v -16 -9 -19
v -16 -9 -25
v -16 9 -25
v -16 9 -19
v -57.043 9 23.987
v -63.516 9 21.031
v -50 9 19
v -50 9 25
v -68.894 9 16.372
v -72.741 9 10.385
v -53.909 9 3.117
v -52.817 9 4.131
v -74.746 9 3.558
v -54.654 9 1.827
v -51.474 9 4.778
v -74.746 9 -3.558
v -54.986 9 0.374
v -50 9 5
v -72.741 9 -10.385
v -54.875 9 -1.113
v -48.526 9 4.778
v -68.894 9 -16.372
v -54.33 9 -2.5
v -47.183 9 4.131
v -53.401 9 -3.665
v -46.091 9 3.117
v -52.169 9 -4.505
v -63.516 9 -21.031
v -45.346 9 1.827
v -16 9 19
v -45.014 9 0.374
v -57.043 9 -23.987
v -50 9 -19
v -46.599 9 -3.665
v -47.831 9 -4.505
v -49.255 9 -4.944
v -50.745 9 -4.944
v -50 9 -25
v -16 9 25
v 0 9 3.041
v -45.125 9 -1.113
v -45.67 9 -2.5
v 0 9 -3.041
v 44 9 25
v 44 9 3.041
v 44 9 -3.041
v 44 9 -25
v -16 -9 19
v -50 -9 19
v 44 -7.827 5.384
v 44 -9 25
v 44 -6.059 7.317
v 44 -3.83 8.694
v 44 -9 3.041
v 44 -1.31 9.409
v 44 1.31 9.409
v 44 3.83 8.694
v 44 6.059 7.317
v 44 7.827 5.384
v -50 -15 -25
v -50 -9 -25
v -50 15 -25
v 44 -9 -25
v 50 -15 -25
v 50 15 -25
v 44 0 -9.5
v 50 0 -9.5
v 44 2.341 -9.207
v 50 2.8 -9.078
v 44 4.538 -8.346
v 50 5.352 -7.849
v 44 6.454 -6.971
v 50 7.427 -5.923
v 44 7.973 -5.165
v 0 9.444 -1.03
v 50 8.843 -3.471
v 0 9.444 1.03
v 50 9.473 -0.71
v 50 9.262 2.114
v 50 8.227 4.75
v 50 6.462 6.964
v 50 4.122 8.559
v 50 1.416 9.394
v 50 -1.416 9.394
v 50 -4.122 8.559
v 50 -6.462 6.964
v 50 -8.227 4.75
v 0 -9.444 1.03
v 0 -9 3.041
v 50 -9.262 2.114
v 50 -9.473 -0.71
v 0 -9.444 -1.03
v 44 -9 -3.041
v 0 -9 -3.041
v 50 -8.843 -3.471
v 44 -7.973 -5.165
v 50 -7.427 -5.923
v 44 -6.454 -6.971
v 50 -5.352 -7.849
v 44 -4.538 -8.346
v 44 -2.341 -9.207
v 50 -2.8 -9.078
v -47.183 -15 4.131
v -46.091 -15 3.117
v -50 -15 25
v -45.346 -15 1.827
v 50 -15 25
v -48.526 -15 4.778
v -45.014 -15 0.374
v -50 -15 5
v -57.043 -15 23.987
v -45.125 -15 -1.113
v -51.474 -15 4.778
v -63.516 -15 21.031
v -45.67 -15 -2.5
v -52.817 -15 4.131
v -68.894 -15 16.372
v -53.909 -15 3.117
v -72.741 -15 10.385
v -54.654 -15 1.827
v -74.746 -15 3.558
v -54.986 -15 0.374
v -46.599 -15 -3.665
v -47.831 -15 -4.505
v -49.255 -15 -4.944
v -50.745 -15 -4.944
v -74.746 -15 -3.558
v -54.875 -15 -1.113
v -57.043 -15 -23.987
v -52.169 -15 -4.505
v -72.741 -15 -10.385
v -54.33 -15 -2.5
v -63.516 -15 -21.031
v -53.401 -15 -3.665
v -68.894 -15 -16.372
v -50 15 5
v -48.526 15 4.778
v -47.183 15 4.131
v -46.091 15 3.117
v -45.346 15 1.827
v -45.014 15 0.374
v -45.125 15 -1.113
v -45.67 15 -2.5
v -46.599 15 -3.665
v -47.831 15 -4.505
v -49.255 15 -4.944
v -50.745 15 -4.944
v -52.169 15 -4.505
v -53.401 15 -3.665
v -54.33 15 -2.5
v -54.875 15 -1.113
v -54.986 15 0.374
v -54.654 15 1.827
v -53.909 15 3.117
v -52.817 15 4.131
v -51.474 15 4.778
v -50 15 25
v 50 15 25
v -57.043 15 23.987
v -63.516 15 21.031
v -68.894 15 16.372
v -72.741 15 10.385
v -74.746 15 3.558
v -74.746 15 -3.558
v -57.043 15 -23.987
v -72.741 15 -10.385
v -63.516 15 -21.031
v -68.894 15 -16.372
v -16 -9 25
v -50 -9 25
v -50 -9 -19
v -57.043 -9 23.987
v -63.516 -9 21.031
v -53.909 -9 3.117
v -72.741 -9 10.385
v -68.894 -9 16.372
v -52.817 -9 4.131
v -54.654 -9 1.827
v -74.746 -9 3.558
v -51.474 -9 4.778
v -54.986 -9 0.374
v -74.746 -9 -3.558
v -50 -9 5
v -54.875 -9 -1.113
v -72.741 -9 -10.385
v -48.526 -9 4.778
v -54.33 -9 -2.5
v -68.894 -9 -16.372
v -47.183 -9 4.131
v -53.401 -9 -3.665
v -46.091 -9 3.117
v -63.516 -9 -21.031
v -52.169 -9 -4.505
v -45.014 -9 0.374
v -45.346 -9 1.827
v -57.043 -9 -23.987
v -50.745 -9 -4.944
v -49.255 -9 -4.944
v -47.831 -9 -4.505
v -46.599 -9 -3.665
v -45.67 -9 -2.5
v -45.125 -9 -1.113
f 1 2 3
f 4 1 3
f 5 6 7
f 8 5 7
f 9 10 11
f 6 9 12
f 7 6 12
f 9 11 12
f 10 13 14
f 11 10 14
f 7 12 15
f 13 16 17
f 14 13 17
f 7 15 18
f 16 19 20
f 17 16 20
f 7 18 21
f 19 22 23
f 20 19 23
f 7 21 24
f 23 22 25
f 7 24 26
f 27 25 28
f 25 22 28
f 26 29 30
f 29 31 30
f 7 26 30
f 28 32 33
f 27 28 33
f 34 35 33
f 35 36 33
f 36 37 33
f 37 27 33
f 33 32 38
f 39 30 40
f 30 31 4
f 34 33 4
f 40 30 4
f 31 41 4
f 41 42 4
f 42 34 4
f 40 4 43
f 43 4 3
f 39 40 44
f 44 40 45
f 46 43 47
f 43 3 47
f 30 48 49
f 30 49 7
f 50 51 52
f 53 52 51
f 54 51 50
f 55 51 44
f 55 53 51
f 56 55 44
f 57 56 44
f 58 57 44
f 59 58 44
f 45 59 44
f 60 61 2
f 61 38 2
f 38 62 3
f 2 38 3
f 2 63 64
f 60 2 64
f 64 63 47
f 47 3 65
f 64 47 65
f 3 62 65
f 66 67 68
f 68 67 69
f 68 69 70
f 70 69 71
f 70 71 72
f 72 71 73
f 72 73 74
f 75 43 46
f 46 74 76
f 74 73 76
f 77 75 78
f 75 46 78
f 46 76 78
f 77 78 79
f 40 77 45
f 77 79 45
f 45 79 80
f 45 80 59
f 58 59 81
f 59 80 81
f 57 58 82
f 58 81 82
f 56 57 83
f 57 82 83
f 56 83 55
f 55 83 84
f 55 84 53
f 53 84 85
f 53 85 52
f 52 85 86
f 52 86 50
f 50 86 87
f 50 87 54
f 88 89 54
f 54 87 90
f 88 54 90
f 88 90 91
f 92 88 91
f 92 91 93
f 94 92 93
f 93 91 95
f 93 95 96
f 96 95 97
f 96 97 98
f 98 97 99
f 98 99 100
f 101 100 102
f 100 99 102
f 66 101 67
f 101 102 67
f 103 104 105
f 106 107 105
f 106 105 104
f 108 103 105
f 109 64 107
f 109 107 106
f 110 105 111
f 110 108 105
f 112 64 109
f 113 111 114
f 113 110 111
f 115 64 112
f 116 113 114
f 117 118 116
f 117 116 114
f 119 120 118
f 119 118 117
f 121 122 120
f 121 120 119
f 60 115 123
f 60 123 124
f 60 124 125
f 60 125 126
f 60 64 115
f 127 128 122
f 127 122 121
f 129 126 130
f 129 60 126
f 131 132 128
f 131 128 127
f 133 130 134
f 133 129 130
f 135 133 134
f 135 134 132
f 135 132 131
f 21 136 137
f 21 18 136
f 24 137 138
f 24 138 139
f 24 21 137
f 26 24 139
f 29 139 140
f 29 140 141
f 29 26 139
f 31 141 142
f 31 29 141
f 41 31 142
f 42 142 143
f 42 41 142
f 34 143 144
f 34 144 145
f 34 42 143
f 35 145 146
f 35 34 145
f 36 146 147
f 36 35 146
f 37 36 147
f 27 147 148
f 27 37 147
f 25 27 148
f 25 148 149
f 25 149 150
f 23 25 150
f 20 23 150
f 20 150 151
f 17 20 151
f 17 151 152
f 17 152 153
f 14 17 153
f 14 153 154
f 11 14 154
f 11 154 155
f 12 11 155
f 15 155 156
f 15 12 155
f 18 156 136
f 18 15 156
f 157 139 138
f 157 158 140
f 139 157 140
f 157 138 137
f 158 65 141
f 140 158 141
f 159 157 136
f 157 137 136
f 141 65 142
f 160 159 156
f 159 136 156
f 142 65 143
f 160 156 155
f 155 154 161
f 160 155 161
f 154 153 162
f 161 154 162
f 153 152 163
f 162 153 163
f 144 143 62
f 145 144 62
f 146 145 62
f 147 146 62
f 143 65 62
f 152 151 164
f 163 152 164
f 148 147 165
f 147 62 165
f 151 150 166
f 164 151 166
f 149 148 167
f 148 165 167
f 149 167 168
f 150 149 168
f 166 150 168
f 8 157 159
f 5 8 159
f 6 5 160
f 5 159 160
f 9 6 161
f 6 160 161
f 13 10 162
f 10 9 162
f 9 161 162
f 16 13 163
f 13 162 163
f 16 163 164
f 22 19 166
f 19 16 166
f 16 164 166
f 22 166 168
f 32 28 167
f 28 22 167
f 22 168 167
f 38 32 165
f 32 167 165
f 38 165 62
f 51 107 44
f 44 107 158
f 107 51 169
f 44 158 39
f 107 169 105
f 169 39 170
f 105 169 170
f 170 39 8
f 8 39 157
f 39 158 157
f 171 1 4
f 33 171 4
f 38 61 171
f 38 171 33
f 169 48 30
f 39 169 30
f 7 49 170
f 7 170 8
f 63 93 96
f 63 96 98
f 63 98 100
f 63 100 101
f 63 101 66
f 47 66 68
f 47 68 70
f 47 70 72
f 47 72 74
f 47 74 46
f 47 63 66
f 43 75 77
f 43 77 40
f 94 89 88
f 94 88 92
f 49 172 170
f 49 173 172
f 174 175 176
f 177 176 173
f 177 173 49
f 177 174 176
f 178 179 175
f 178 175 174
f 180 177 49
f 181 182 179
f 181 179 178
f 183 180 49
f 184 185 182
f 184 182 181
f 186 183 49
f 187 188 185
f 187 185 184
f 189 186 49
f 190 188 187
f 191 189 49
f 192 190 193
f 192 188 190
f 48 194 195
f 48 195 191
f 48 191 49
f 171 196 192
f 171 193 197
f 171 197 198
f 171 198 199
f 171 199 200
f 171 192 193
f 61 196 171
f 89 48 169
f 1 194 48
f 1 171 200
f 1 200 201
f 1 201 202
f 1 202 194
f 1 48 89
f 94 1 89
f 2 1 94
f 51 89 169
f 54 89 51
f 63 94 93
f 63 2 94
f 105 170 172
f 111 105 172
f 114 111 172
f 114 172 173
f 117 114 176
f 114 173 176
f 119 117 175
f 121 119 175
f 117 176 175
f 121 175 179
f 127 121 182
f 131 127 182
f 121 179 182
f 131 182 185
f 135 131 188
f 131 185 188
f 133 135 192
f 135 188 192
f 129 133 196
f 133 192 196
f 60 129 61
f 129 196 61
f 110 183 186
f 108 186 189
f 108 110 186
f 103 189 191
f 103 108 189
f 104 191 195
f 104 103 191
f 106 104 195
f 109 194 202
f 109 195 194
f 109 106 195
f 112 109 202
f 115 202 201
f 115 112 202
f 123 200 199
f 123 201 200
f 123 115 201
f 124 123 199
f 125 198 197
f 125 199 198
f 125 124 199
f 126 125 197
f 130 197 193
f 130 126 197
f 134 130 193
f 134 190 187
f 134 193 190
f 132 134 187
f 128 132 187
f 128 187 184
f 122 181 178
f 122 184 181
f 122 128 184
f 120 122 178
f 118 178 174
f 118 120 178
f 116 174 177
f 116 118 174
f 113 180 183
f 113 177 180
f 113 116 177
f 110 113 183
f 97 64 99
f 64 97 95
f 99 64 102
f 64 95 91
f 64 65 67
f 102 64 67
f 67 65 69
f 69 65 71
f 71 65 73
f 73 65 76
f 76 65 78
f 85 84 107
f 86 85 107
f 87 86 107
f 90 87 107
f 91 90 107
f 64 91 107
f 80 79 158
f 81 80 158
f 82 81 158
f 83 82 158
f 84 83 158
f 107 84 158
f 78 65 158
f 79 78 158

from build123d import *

# Parameters (mm, degrees)
SKETCH1_R               = 5
BOSS_EXTRUDE1_DEPTH     = 15
SKETCH5_R               = 9.5
CUT_EXTRUDE1_DEPTH      = 50
CUT_EXTRUDE2_DEPTH      = 81.467384697
CUT_EXTRUDE2_DEPTH_BACK = 81.467384697
SKETCH6_W               = 60
SKETCH6_H               = 18
SKETCH6_W_2             = 25
SKETCH7_W               = 38
SKETCH7_H               = 18
CUT_EXTRUDE3_DEPTH      = 73.15261603


with BuildPart() as part:
    # Sketch1 → Boss-Extrude1 (new, symmetric)
    with BuildSketch(Plane(origin=(0, 0, 0), x_dir=(1, 0, 0), z_dir=(0, 1, 0))):
        with BuildLine():
            Line((-50, 25), (50, 25))
            Line((50, 25), (50, -25))
            Line((50, -25), (-50, -25))
            ThreePointArc((-50, -25), (-75, 0), (-50, 25))
        make_face()
        with Locations(Location((-50, 0, 0), (0, 0, 270))):
            Circle(SKETCH1_R, mode=Mode.SUBTRACT)
    extrude(amount=BOSS_EXTRUDE1_DEPTH, both=True)

    # Sketch5 → Cut-Extrude1 (cut)
    with BuildSketch(Plane(origin=(50, 0, 0), x_dir=(0, 0, -1), z_dir=(1, 0, 0))):
        Circle(SKETCH5_R)
    extrude(amount=-CUT_EXTRUDE1_DEPTH, mode=Mode.SUBTRACT)

    # Sketch6 → Cut-Extrude2 (cut, two sides: drawn at the far end of the back side and taken through both)
    with BuildSketch(Plane.XY.offset(-CUT_EXTRUDE2_DEPTH_BACK)):
        with Locations((14, 0)):
            Rectangle(SKETCH6_W, SKETCH6_H)
        with Locations((-62.5, 0)):
            Rectangle(SKETCH6_W_2, SKETCH6_H)
    extrude(amount=CUT_EXTRUDE2_DEPTH + CUT_EXTRUDE2_DEPTH_BACK, mode=Mode.SUBTRACT)

    # Sketch7 → Cut-Extrude3 (cut, through all)
    with BuildSketch(Plane(origin=(-16, 0, 0), x_dir=(0, 0, -1), z_dir=(1, 0, 0))):
        Rectangle(SKETCH7_W, SKETCH7_H)
    extrude(amount=-CUT_EXTRUDE3_DEPTH, mode=Mode.SUBTRACT)


solid = part.part
